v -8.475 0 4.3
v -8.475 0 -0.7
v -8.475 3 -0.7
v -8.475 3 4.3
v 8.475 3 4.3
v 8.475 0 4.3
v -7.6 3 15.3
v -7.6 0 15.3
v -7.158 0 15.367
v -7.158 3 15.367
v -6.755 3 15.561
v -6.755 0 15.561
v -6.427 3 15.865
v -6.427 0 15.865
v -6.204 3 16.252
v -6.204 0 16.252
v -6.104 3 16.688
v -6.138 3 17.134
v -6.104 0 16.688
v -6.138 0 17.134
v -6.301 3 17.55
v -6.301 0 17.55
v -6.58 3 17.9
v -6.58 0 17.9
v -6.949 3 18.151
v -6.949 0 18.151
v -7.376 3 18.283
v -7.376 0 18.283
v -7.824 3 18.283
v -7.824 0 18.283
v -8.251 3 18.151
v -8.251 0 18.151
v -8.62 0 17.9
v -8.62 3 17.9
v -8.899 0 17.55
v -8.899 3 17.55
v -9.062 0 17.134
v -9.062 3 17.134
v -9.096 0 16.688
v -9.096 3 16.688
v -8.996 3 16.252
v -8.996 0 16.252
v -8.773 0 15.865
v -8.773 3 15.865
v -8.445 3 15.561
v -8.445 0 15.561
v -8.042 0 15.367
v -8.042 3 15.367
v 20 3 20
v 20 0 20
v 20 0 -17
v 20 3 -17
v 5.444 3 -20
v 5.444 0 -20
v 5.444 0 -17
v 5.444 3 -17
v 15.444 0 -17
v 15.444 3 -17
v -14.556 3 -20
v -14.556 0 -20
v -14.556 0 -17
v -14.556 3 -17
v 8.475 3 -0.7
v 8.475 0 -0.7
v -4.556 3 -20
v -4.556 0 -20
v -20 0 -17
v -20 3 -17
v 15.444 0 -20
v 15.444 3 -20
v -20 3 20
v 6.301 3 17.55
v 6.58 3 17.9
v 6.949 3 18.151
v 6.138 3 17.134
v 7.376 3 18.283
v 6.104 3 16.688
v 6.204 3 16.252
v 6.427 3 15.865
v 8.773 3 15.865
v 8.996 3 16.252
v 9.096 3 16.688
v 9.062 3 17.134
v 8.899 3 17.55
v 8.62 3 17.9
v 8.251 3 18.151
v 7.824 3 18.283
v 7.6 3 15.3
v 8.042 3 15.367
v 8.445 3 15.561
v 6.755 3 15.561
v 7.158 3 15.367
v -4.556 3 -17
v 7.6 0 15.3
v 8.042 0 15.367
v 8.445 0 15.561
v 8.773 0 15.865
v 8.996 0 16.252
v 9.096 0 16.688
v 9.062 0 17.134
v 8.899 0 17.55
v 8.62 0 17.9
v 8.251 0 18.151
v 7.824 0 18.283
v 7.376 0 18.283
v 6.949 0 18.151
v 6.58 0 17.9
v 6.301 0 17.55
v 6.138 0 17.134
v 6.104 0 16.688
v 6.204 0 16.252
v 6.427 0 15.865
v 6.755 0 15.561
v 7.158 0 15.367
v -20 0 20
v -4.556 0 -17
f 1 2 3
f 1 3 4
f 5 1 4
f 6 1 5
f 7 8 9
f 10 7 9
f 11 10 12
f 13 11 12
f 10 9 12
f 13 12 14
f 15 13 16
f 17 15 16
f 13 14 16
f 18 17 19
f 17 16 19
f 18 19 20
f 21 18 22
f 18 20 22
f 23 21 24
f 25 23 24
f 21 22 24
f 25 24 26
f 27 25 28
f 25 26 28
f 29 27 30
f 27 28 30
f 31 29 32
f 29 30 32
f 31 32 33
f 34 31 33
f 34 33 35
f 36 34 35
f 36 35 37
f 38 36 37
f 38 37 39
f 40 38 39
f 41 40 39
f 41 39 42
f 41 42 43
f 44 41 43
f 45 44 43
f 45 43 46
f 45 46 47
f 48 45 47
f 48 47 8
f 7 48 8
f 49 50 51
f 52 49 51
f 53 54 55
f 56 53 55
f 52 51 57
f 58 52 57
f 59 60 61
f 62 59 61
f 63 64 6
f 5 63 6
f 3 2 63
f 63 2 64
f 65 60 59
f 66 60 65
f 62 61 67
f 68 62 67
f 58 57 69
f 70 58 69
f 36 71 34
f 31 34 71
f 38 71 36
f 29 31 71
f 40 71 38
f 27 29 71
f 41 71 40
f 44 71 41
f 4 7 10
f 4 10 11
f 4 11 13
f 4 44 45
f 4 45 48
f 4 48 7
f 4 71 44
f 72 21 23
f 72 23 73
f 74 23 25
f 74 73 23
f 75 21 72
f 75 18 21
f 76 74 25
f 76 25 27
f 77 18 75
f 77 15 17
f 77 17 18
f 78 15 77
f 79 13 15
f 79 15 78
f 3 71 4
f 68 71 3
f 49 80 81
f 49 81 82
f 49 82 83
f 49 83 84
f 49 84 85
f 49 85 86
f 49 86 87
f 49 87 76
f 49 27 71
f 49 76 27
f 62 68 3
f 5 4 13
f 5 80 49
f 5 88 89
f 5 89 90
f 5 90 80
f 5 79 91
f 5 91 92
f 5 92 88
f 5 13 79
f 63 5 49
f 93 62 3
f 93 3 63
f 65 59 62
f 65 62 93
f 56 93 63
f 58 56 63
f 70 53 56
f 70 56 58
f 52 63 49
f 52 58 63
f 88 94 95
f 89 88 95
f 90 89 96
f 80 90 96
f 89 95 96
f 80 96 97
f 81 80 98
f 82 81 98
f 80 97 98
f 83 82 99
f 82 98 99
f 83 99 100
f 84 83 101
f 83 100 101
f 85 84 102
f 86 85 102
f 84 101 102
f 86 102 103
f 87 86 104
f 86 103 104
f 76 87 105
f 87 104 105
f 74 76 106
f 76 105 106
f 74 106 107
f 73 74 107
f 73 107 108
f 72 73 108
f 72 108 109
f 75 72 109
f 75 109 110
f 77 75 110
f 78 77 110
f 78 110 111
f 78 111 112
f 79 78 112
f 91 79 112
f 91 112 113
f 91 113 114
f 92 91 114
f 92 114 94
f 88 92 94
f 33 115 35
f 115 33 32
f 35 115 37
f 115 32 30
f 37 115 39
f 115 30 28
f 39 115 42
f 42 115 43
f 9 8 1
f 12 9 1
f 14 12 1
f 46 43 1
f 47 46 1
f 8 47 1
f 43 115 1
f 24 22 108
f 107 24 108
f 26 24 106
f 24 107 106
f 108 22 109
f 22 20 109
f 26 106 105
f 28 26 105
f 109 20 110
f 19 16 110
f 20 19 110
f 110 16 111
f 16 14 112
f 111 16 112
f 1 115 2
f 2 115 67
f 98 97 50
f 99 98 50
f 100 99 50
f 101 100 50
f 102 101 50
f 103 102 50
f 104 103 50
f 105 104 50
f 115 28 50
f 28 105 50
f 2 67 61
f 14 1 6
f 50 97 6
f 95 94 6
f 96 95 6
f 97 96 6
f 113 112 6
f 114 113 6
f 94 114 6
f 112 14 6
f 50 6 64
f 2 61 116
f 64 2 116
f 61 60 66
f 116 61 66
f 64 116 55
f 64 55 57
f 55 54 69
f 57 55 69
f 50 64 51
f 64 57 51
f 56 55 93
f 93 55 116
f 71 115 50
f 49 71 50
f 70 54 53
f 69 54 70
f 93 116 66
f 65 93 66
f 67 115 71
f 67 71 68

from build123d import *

# Parameters (mm, degrees)
SKETCH1_W           = 40
SKETCH1_H           = 40
BOSS_EXTRUDE1_DEPTH = 3
SKETCH2_R           = 1.5
SKETCH2_W           = 16.950963154
SKETCH2_H           = 5
CUT_EXTRUDE2_DEPTH  = 10
CUT_EXTRUDE3_DEPTH  = 10


with BuildPart() as part:
    # Sketch1 → Boss-Extrude1 (new body)
    with BuildSketch(Plane(origin=(0, 0, 0), x_dir=(1, 0, 0), z_dir=(0, 1, 0))):
        Rectangle(SKETCH1_W, SKETCH1_H)
    extrude(amount=BOSS_EXTRUDE1_DEPTH)

    # Sketch2 → Cut-Extrude2 (cut)
    with BuildSketch(Plane.XZ):
        with Locations(Location((7.6, 16.8, 0), (0, 0, 270))):
            Circle(SKETCH2_R)
        with Locations(Location((-7.6, 16.8, 0), (0, 0, 270))):
            Circle(SKETCH2_R)
        with Locations((0, 1.8)):
            Rectangle(SKETCH2_W, SKETCH2_H)
    extrude(amount=-CUT_EXTRUDE2_DEPTH, mode=Mode.SUBTRACT)

    # Sketch5 → Cut-Extrude3 (cut)
    with BuildSketch(Plane.XZ):
        Polygon((20, -17), (15.444490667, -17), (15.444490667, -20), (5.444490667, -20), (5.444490667, -17), (-4.555509333, -17), (-4.555509333, -20), (-14.555509333, -20), (-14.555509333, -17), (-20, -17), (-20, -21.558033771), (20, -21.558033771), align=None)
    extrude(amount=-CUT_EXTRUDE3_DEPTH, mode=Mode.SUBTRACT)


solid = part.part
